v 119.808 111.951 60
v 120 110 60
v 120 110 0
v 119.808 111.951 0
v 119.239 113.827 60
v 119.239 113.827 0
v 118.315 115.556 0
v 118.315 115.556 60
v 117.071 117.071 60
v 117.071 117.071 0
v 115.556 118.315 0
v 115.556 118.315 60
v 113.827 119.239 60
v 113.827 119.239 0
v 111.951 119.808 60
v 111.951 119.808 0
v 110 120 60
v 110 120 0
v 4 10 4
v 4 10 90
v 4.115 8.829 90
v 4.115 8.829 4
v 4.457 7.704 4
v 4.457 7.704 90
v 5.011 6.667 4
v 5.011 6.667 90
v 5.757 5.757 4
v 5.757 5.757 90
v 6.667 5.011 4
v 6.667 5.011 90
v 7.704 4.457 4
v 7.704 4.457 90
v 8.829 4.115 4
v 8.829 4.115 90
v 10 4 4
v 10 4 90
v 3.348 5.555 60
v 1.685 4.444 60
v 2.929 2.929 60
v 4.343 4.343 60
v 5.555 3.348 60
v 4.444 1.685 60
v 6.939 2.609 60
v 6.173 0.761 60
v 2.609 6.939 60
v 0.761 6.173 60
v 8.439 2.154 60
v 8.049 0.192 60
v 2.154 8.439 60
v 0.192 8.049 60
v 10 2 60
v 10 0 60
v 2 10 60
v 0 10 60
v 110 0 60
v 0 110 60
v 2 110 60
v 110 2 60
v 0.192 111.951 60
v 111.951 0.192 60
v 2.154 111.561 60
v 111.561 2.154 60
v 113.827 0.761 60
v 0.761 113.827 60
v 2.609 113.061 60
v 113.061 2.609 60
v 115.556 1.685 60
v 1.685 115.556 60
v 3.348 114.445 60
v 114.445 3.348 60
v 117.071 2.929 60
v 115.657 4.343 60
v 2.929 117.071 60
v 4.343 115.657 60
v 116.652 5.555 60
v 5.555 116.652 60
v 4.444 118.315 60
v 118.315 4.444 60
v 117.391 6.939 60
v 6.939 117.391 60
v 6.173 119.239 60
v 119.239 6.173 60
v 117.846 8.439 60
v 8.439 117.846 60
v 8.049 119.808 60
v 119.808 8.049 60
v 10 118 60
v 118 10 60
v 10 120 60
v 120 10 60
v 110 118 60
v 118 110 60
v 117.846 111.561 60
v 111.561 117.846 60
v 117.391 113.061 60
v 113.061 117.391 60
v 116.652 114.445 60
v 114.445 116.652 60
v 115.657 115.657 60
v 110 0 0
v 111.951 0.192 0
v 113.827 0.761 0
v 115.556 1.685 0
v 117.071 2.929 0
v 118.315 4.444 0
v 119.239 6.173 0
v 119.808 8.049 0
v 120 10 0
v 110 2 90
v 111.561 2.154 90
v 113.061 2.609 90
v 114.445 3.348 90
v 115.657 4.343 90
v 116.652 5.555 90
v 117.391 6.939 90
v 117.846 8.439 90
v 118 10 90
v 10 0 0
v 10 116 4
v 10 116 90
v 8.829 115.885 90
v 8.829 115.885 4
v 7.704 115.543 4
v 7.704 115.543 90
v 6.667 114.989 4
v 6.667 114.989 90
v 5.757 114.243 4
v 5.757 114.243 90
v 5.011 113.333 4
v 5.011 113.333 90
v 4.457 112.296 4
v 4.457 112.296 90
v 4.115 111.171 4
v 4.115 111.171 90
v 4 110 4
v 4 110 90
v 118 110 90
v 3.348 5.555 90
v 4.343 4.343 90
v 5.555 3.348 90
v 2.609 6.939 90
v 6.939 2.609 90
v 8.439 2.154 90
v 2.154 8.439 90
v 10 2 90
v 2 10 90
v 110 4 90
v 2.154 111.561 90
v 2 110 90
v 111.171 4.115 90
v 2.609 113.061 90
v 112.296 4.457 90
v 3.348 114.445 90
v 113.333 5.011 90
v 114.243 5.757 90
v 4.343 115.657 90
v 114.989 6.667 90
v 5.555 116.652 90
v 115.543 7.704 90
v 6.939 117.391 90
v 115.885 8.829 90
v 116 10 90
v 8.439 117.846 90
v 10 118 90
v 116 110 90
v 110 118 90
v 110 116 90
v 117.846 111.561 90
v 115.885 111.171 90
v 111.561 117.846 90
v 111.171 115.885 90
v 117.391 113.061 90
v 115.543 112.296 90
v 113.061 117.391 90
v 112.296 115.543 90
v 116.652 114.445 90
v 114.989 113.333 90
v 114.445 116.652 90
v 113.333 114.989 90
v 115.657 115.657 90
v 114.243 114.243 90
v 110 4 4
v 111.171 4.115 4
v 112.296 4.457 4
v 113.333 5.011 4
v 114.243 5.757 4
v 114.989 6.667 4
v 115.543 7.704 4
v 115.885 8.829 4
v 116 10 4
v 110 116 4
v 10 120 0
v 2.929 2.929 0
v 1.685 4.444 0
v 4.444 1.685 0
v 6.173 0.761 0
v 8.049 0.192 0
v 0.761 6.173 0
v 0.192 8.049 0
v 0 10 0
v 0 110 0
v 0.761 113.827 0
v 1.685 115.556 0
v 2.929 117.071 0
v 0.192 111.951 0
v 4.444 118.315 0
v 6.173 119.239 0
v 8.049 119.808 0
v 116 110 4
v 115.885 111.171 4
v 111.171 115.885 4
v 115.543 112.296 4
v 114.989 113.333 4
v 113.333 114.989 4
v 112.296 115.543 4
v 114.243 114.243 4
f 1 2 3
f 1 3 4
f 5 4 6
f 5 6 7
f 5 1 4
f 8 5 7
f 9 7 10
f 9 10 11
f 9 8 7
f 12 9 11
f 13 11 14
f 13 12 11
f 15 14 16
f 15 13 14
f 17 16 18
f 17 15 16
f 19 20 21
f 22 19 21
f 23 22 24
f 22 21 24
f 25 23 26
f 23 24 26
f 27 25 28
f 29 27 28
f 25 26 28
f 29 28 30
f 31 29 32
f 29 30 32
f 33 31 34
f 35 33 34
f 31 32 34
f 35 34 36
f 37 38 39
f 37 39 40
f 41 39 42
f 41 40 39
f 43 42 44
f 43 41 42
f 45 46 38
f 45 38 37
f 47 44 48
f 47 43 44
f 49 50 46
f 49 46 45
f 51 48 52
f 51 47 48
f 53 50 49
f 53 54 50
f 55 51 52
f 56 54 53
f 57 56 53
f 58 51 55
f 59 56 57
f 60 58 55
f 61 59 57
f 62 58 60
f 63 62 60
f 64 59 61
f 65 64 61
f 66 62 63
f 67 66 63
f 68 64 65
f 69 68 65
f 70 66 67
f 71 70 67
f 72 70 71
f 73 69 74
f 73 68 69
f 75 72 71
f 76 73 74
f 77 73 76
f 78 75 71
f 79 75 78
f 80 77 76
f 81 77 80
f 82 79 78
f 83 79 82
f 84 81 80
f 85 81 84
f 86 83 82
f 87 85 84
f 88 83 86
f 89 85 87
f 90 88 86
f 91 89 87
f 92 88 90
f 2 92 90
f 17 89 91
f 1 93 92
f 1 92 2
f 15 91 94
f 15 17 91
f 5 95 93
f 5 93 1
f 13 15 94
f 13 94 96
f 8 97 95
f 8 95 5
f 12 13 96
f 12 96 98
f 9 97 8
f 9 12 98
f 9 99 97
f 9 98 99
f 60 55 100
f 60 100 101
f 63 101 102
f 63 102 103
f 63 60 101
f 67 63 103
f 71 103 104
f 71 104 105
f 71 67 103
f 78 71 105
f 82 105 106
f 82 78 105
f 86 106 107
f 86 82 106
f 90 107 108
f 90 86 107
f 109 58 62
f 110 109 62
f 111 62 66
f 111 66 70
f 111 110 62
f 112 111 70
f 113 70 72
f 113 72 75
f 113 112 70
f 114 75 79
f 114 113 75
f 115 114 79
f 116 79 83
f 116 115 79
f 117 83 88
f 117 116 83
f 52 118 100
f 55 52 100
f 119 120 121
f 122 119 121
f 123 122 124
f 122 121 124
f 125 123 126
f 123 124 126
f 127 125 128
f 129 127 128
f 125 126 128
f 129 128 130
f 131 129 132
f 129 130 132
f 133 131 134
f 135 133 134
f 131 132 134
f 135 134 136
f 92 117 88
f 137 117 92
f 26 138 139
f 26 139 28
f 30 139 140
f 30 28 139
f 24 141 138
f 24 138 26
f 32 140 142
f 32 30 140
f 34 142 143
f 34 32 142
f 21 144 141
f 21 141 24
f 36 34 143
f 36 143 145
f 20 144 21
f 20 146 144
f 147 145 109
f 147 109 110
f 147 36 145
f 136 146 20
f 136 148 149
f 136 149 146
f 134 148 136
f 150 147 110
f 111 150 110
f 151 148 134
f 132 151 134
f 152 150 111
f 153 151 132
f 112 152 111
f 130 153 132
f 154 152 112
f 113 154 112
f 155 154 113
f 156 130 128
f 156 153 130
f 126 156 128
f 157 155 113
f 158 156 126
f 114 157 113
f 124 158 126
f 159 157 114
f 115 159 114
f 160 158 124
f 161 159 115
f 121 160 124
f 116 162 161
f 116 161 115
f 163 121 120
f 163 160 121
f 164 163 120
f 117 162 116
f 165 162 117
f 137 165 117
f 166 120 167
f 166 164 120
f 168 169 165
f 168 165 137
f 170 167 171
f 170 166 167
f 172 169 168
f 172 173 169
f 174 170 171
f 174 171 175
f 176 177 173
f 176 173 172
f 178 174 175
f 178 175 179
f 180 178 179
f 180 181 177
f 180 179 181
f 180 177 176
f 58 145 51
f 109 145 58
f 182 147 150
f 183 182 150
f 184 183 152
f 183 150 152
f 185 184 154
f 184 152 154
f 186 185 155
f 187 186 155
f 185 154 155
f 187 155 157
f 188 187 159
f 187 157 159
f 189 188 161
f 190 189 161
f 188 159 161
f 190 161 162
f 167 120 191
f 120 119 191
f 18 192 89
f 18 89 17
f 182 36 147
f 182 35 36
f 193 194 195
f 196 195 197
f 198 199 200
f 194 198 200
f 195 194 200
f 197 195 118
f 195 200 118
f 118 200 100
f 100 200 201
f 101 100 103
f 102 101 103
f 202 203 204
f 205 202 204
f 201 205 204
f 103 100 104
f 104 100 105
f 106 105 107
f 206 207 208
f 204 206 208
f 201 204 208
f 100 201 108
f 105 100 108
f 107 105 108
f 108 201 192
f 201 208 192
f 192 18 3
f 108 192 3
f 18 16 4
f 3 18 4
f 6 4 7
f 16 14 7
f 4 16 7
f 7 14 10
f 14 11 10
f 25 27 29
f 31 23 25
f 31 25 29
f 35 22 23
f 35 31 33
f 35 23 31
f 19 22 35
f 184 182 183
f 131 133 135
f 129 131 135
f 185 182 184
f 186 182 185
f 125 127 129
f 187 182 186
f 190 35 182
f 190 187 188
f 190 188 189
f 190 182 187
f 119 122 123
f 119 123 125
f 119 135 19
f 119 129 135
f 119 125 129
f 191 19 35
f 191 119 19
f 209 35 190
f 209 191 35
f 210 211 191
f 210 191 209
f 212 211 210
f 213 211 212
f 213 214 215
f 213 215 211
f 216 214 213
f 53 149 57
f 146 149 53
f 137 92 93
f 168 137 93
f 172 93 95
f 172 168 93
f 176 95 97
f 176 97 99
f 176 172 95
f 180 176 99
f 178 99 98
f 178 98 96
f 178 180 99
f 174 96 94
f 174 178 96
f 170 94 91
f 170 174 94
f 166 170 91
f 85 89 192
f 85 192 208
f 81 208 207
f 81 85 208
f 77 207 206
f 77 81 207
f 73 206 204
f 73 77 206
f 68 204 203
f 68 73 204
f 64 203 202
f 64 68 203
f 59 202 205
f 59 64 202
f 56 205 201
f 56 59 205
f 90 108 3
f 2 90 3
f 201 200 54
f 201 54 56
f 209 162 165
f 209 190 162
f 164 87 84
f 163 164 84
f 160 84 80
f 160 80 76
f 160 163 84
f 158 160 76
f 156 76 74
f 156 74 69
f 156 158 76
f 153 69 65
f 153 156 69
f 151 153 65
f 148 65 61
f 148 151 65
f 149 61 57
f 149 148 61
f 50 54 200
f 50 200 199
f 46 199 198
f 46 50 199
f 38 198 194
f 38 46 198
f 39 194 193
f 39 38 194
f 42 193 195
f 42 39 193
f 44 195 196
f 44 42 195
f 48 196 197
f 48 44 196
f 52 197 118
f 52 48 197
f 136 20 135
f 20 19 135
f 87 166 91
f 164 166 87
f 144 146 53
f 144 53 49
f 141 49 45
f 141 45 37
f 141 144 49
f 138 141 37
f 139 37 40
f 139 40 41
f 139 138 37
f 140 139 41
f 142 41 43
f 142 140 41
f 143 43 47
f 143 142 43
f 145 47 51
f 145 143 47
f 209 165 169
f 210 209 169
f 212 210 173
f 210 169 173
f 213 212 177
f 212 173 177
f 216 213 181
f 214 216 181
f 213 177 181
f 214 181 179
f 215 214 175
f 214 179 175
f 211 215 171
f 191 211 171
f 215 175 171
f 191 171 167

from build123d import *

# Parameters (mm, degrees)
SKICA1_W                 = 120
SKICA1_H                 = 120
VYSUNOUT1_DEPTH          = 90
ZAOBLIT1_R               = 10
ZAOBLIT2_R               = 10
ZAOBLIT3_R               = 10
ZAOBLIT4_R               = 10
SKO_EPINA4_T             = -4
SKICA2_OUTSIDE_W         = 160.418
SKICA2_OUTSIDE_H         = 160.418
ODEBRAT_VYSUNUT_M1_DEPTH = 30


with BuildPart() as part:
    # Skica1 → Vysunout1 (new body)
    with BuildSketch(Plane.XY):
        with Locations((60, 60)):
            Rectangle(SKICA1_W, SKICA1_H)
    extrude(amount=VYSUNOUT1_DEPTH)

    # Zaoblit1
    zaoblit1_edges = [part.edges().sort_by_distance(p)[0] for p in [
        (120, 120, 45),
    ]]
    fillet(zaoblit1_edges, radius=ZAOBLIT1_R)

    # Zaoblit2
    zaoblit2_edges = [part.edges().sort_by_distance(p)[0] for p in [
        (0, 120, 45),
    ]]
    fillet(zaoblit2_edges, radius=ZAOBLIT2_R)

    # Zaoblit3
    zaoblit3_edges = [part.edges().sort_by_distance(p)[0] for p in [
        (0, 0, 45),
    ]]
    fillet(zaoblit3_edges, radius=ZAOBLIT3_R)

    # Zaoblit4
    zaoblit4_edges = [part.edges().sort_by_distance(p)[0] for p in [
        (120, 0, 45),
    ]]
    fillet(zaoblit4_edges, radius=ZAOBLIT4_R)

    # Skořepina4
    sko_epina4_openings = [part.faces().sort_by_distance(p)[0] for p in [
        (60, 60, 90),
    ]]
    offset(amount=SKO_EPINA4_T, openings=sko_epina4_openings, kind=Kind.INTERSECTION)

    # Skica2 outside → Odebrat vysunutím1 (cut)
    with BuildSketch(Plane.XY.offset(90)):
        with Locations((60, 60)):
            Rectangle(SKICA2_OUTSIDE_W, SKICA2_OUTSIDE_H)
        with BuildLine():
            Line((10, 2), (110, 2))
            ThreePointArc((110, 2), (115.656854249, 4.343145751), (118, 10))
            Line((118, 10), (118, 110))
            ThreePointArc((118, 110), (115.656854249, 115.656854249), (110, 118))
            Line((110, 118), (10, 118))
            ThreePointArc((10, 118), (4.343145751, 115.656854249), (2, 110))
            Line((2, 110), (2, 10))
            ThreePointArc((2, 10), (4.343145751, 4.343145751), (10, 2))
        make_face(mode=Mode.SUBTRACT)
    extrude(amount=-ODEBRAT_VYSUNUT_M1_DEPTH, mode=Mode.SUBTRACT)


solid = part.part
